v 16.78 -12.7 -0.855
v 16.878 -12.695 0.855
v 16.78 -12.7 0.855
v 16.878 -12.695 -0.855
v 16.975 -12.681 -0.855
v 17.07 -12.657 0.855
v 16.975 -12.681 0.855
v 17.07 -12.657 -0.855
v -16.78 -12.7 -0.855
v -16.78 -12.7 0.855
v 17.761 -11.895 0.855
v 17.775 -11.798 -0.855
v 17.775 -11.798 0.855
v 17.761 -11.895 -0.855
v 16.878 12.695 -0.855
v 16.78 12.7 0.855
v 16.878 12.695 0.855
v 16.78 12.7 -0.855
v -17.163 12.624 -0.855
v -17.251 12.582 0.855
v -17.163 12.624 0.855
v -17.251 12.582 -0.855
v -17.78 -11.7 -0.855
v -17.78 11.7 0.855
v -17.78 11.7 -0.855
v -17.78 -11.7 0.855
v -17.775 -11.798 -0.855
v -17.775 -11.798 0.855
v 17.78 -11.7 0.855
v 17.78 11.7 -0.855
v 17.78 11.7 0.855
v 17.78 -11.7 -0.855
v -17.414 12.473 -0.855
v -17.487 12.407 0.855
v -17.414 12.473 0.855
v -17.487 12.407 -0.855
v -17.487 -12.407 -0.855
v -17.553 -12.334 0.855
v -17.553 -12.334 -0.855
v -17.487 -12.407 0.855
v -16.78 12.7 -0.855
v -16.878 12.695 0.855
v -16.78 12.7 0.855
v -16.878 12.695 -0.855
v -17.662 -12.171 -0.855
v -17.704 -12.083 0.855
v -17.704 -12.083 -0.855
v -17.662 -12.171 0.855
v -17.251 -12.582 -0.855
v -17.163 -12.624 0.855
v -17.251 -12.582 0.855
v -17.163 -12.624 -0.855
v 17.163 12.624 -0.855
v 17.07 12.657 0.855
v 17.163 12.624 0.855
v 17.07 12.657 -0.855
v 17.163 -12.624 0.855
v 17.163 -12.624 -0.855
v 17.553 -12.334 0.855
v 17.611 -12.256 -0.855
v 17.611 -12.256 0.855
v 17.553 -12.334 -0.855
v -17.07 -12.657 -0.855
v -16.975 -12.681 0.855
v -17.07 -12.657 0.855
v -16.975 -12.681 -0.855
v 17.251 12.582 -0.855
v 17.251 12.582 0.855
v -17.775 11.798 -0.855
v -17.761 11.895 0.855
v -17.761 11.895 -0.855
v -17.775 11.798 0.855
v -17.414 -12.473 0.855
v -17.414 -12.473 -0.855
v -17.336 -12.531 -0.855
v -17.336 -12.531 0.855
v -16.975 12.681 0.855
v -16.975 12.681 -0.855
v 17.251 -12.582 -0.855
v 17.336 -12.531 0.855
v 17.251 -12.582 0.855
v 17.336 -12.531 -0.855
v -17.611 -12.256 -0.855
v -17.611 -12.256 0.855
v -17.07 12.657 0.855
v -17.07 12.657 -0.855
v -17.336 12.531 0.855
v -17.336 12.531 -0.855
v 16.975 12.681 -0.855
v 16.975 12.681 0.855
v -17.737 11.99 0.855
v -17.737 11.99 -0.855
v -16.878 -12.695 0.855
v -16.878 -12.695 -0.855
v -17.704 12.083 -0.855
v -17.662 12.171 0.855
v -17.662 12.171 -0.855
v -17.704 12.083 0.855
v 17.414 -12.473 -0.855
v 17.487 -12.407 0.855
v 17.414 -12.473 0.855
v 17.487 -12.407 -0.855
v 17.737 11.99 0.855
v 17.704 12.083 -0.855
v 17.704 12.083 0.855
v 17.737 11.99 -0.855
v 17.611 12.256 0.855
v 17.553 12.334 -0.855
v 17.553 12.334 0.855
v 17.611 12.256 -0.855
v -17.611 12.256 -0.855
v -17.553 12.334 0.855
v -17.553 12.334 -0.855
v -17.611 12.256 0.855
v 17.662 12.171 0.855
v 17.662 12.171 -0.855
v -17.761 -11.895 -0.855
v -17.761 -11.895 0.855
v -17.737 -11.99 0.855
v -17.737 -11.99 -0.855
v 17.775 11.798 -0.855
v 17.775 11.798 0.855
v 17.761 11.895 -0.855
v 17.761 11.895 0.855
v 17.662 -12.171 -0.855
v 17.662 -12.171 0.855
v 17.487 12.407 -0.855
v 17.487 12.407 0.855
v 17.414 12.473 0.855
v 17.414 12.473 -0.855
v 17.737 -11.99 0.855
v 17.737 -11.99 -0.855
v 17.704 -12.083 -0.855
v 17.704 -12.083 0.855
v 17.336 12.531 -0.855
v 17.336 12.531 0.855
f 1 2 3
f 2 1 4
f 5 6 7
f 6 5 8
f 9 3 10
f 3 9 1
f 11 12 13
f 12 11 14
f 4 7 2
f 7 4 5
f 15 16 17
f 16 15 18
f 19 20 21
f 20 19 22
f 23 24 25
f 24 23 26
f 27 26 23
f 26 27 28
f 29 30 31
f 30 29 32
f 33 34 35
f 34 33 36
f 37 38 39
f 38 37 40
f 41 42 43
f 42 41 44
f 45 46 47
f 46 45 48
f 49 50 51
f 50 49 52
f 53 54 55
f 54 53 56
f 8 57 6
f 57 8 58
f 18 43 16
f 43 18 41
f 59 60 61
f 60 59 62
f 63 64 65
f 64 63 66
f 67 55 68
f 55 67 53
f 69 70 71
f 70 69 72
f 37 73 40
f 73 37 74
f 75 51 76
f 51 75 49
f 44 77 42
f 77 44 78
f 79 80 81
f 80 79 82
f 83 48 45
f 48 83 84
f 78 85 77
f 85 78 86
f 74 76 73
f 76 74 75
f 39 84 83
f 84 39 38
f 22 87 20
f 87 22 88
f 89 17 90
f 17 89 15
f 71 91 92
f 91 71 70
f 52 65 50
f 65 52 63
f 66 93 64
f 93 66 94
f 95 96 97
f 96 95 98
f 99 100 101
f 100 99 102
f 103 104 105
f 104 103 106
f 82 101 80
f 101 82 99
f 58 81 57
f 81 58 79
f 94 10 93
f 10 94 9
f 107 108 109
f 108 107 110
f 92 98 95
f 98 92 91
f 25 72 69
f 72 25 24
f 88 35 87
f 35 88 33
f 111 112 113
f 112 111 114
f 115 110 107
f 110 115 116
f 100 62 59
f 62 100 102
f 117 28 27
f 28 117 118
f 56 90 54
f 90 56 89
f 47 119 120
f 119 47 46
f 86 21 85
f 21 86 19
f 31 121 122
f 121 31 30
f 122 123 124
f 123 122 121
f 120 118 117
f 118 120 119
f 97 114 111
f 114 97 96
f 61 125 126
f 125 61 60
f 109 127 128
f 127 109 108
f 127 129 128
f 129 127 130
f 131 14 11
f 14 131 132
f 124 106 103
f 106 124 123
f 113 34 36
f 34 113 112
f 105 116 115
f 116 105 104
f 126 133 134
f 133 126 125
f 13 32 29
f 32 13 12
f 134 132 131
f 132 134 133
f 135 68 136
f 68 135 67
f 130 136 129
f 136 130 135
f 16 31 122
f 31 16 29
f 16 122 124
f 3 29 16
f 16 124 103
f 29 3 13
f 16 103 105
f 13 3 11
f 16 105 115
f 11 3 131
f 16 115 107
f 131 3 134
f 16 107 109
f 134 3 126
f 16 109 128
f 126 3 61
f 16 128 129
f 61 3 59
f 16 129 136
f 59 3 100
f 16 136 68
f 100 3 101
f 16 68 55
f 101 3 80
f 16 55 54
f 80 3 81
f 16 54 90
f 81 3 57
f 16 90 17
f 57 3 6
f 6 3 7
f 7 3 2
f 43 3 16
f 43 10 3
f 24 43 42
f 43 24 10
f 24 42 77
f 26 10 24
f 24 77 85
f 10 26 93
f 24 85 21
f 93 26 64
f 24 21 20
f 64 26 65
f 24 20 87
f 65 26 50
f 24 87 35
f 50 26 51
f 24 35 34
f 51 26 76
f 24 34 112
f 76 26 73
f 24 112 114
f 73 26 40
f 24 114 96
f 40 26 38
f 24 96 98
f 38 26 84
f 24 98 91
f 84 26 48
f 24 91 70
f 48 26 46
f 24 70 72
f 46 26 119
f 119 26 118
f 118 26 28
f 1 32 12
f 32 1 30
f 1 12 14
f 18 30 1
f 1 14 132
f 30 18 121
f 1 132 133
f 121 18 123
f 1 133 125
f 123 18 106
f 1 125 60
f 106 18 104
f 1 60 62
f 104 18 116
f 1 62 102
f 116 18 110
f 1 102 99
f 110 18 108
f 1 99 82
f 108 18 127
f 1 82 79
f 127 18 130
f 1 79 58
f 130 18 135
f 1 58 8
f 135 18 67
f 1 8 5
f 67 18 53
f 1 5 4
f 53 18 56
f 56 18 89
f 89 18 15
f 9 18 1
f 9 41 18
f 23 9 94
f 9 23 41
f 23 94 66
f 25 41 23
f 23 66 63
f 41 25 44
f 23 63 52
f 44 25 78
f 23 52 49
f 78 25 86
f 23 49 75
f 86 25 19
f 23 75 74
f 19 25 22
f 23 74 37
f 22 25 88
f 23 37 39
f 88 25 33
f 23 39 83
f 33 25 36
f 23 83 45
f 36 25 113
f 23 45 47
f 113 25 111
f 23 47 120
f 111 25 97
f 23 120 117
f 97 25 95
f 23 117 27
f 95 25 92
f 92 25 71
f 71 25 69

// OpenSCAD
$fn = 64;

// Exact PCB dimensions (mm)
length_mm    = 35.56;
width_mm     = 25.4;
thickness_mm = 1.6;

// Detail parameters (kept within PCB envelope)
corner_r = 1.0;     // rounded corner radius (<= min(length,width)/2)
copper_t = 0.035;   // copper thickness (typical 1 oz)
mask_t   = 0.02;    // soldermask thickness
eps      = 0.01;    // small overlap to ensure watertight unions

module rounded_rect_prism(l, w, h, r) {
    r2 = min(r, min(l, w)/2);
    linear_extrude(height=h, center=true)
        offset(r=r2)
            square([l - 2*r2, w - 2*r2], center=true);
}

module pcb() {
    // One connected solid: FR4 core + copper + soldermask, all overlapping slightly
    union() {
        // FR4 core
        color([0.0, 0.4, 0.2])
            rounded_rect_prism(length_mm, width_mm, thickness_mm, corner_r);

        // Top copper (overlaps into core by eps)
        color([0.72, 0.45, 0.2])
            translate([0, 0, thickness_mm/2 - eps + copper_t/2])
                rounded_rect_prism(length_mm, width_mm, copper_t + 2*eps, corner_r);

        // Bottom copper (overlaps into core by eps)
        color([0.72, 0.45, 0.2])
            translate([0, 0, -thickness_mm/2 + eps - copper_t/2])
                rounded_rect_prism(length_mm, width_mm, copper_t + 2*eps, corner_r);

        // Top soldermask (overlaps into copper by eps)
        color([0.0, 0.35, 0.18])
            translate([0, 0, thickness_mm/2 + copper_t - eps + mask_t/2])
                rounded_rect_prism(length_mm, width_mm, mask_t + 2*eps, corner_r);

        // Bottom soldermask (overlaps into copper by eps)
        color([0.0, 0.35, 0.18])
            translate([0, 0, -thickness_mm/2 - copper_t + eps - mask_t/2])
                rounded_rect_prism(length_mm, width_mm, mask_t + 2*eps, corner_r);
    }
}

pcb();
